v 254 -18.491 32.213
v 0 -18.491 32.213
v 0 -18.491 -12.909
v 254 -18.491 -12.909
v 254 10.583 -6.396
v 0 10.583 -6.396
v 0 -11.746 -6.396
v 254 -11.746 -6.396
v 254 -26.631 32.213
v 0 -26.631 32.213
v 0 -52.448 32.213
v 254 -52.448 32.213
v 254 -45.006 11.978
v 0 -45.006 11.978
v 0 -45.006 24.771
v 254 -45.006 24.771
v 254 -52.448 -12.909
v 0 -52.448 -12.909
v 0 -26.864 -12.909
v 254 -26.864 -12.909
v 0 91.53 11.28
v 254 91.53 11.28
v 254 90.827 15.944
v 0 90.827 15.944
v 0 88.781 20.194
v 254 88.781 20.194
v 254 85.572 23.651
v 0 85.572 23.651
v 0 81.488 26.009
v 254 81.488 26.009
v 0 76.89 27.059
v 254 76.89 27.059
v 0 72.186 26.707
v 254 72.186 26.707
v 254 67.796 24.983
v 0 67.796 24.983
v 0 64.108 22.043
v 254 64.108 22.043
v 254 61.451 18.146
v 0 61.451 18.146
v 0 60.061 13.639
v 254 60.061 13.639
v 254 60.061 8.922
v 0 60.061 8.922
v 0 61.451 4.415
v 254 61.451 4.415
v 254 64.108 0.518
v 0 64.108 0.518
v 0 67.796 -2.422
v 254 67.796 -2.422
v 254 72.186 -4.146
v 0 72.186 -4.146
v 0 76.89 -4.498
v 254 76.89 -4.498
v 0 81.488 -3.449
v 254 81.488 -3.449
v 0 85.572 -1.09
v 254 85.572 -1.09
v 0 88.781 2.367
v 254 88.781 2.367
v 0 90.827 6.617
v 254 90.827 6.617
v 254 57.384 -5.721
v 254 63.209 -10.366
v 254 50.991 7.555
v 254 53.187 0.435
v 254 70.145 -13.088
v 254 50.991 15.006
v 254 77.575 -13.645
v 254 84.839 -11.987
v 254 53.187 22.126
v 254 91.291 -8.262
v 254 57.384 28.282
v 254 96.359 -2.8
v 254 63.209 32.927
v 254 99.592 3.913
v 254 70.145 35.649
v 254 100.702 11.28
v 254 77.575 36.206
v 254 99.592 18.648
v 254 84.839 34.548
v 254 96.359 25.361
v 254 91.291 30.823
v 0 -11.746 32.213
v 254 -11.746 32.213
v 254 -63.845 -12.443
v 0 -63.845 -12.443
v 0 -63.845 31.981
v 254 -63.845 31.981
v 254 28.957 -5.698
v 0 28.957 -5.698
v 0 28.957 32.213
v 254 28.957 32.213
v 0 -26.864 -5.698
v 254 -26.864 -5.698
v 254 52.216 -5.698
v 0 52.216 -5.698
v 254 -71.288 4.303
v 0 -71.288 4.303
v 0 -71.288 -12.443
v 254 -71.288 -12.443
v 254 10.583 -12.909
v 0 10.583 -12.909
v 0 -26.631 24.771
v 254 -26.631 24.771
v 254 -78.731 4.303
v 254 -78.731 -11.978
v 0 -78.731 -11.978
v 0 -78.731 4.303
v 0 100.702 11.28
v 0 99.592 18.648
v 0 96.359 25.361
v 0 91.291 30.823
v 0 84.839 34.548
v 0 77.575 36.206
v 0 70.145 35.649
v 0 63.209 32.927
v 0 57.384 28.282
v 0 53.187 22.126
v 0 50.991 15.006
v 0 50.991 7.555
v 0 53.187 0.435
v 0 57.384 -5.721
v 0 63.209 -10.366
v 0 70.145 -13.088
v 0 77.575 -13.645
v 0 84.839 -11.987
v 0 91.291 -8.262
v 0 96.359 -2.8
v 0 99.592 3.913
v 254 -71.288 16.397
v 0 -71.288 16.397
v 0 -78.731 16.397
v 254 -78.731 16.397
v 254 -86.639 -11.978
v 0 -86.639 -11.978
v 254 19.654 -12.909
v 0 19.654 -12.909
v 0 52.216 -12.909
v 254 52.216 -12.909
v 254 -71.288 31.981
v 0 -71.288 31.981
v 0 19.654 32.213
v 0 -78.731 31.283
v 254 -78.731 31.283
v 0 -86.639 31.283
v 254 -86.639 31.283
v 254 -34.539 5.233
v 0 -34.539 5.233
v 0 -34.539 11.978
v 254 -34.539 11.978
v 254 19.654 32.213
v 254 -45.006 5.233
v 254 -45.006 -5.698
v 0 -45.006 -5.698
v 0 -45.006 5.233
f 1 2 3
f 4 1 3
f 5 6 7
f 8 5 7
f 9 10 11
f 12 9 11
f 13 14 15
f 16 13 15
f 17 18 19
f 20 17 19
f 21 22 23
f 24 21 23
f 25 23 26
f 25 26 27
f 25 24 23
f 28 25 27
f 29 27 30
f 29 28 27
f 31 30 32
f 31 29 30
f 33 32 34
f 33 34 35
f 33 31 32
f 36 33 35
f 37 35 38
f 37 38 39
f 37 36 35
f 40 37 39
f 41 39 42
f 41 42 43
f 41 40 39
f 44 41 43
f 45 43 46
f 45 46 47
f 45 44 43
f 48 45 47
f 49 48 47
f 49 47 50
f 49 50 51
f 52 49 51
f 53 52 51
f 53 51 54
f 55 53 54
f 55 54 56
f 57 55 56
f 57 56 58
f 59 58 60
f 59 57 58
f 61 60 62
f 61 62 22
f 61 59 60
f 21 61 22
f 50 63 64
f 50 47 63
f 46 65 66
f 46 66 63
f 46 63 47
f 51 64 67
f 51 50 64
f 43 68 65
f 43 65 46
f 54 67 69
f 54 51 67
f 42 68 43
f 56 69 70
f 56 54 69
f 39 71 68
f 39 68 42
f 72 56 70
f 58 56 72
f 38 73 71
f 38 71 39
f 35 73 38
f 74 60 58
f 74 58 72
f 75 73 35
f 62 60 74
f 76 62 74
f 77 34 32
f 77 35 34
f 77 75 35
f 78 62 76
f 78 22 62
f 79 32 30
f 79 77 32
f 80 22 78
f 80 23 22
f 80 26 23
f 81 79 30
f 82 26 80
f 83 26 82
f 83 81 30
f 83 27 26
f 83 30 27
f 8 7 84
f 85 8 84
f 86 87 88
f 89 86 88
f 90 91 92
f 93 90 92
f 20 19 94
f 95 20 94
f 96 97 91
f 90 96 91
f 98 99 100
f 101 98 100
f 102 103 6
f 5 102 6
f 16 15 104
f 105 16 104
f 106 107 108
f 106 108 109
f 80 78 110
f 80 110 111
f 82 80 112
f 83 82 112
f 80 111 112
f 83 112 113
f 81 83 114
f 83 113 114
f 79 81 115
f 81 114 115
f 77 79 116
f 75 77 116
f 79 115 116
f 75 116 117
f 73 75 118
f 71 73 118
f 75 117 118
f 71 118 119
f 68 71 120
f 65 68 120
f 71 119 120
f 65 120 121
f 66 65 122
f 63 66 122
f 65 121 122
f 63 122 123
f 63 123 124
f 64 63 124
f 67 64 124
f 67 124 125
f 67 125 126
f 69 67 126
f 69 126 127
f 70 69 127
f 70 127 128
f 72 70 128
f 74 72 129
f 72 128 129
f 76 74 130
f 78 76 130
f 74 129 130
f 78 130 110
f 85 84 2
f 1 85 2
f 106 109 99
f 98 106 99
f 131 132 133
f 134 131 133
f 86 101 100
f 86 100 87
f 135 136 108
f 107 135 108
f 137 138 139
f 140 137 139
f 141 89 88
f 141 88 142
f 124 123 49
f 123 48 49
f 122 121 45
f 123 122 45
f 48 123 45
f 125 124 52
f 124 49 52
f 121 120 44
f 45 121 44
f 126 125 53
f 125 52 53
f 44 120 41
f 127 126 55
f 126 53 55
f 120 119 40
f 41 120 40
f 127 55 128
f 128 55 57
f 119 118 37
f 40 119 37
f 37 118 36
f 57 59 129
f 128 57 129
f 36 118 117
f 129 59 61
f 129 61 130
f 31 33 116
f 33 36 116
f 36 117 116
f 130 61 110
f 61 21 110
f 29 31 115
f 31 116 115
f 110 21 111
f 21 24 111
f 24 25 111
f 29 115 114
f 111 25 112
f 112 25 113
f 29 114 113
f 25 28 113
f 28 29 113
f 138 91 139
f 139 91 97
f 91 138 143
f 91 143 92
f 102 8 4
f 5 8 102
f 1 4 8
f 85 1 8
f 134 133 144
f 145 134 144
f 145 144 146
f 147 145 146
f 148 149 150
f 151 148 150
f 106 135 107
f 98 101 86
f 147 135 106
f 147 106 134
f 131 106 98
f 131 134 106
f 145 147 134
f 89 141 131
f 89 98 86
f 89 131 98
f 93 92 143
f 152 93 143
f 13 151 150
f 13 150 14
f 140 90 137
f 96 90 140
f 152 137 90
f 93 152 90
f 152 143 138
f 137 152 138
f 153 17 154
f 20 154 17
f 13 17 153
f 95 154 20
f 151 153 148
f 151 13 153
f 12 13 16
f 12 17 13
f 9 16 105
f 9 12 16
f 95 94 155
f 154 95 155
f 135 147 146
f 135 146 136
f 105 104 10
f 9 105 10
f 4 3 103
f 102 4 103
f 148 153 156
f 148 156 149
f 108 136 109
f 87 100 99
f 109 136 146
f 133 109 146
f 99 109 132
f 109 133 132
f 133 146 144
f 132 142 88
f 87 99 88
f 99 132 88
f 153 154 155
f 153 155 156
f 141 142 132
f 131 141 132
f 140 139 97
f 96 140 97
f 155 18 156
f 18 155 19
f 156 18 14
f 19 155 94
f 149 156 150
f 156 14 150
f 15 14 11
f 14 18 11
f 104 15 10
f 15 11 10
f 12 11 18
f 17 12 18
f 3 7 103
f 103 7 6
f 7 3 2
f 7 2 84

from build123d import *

# Parameters (mm, degrees)
F0_R     = 24.995283
F0_R_2   = 15.822775
F1_DEPTH = 254


with BuildPart() as f1:
    # F0 (on Right) → F1 (new body)
    with BuildSketch(Plane.YZ):
        Polygon((-86.638734, 31.28298), (-86.638734, -11.978242), (-78.730769, -11.978242), (-78.730769, 4.302863), (-71.287982, 4.302863), (-71.287982, -12.443416), (-63.845187, -12.443416), (-63.845187, 31.980742), (-71.287982, 31.980742), (-71.287982, 16.397398), (-78.730769, 16.397398), (-78.730769, 31.28298), align=None)
        Polygon((-45.005627, 32.21333), (-52.448418, 32.21333), (-52.448418, -12.90859), (-45.005627, -12.90859), (-26.863825, -12.90859), (-26.863825, -5.698387), (-45.005627, -5.698387), (-45.005627, 5.233212), (-34.5392, 5.233212), (-34.5392, 11.978242), (-45.005627, 11.978242), (-45.005627, 24.770537), (-26.631236, 24.770537), (-26.631236, 32.21333), align=None)
        Polygon((-11.745653, 32.21333), (-18.490683, 32.21333), (-18.490683, -12.90859), (-11.745653, -12.90859), (10.582718, -12.90859), (10.582718, -6.396148), (-11.745653, -6.396148), align=None)
        Polygon((28.957108, 32.21333), (19.65362, 32.21333), (19.65362, -12.90859), (28.957108, -12.90859), (52.215829, -12.90859), (52.215829, -5.698387), (28.957108, -5.698387), align=None)
        with Locations((75.70713, 11.280479)):
            Circle(F0_R)
        with Locations((75.70713, 11.280479)):
            Circle(F0_R_2, mode=Mode.SUBTRACT)
    extrude(amount=F1_DEPTH)


solid = f1.part
